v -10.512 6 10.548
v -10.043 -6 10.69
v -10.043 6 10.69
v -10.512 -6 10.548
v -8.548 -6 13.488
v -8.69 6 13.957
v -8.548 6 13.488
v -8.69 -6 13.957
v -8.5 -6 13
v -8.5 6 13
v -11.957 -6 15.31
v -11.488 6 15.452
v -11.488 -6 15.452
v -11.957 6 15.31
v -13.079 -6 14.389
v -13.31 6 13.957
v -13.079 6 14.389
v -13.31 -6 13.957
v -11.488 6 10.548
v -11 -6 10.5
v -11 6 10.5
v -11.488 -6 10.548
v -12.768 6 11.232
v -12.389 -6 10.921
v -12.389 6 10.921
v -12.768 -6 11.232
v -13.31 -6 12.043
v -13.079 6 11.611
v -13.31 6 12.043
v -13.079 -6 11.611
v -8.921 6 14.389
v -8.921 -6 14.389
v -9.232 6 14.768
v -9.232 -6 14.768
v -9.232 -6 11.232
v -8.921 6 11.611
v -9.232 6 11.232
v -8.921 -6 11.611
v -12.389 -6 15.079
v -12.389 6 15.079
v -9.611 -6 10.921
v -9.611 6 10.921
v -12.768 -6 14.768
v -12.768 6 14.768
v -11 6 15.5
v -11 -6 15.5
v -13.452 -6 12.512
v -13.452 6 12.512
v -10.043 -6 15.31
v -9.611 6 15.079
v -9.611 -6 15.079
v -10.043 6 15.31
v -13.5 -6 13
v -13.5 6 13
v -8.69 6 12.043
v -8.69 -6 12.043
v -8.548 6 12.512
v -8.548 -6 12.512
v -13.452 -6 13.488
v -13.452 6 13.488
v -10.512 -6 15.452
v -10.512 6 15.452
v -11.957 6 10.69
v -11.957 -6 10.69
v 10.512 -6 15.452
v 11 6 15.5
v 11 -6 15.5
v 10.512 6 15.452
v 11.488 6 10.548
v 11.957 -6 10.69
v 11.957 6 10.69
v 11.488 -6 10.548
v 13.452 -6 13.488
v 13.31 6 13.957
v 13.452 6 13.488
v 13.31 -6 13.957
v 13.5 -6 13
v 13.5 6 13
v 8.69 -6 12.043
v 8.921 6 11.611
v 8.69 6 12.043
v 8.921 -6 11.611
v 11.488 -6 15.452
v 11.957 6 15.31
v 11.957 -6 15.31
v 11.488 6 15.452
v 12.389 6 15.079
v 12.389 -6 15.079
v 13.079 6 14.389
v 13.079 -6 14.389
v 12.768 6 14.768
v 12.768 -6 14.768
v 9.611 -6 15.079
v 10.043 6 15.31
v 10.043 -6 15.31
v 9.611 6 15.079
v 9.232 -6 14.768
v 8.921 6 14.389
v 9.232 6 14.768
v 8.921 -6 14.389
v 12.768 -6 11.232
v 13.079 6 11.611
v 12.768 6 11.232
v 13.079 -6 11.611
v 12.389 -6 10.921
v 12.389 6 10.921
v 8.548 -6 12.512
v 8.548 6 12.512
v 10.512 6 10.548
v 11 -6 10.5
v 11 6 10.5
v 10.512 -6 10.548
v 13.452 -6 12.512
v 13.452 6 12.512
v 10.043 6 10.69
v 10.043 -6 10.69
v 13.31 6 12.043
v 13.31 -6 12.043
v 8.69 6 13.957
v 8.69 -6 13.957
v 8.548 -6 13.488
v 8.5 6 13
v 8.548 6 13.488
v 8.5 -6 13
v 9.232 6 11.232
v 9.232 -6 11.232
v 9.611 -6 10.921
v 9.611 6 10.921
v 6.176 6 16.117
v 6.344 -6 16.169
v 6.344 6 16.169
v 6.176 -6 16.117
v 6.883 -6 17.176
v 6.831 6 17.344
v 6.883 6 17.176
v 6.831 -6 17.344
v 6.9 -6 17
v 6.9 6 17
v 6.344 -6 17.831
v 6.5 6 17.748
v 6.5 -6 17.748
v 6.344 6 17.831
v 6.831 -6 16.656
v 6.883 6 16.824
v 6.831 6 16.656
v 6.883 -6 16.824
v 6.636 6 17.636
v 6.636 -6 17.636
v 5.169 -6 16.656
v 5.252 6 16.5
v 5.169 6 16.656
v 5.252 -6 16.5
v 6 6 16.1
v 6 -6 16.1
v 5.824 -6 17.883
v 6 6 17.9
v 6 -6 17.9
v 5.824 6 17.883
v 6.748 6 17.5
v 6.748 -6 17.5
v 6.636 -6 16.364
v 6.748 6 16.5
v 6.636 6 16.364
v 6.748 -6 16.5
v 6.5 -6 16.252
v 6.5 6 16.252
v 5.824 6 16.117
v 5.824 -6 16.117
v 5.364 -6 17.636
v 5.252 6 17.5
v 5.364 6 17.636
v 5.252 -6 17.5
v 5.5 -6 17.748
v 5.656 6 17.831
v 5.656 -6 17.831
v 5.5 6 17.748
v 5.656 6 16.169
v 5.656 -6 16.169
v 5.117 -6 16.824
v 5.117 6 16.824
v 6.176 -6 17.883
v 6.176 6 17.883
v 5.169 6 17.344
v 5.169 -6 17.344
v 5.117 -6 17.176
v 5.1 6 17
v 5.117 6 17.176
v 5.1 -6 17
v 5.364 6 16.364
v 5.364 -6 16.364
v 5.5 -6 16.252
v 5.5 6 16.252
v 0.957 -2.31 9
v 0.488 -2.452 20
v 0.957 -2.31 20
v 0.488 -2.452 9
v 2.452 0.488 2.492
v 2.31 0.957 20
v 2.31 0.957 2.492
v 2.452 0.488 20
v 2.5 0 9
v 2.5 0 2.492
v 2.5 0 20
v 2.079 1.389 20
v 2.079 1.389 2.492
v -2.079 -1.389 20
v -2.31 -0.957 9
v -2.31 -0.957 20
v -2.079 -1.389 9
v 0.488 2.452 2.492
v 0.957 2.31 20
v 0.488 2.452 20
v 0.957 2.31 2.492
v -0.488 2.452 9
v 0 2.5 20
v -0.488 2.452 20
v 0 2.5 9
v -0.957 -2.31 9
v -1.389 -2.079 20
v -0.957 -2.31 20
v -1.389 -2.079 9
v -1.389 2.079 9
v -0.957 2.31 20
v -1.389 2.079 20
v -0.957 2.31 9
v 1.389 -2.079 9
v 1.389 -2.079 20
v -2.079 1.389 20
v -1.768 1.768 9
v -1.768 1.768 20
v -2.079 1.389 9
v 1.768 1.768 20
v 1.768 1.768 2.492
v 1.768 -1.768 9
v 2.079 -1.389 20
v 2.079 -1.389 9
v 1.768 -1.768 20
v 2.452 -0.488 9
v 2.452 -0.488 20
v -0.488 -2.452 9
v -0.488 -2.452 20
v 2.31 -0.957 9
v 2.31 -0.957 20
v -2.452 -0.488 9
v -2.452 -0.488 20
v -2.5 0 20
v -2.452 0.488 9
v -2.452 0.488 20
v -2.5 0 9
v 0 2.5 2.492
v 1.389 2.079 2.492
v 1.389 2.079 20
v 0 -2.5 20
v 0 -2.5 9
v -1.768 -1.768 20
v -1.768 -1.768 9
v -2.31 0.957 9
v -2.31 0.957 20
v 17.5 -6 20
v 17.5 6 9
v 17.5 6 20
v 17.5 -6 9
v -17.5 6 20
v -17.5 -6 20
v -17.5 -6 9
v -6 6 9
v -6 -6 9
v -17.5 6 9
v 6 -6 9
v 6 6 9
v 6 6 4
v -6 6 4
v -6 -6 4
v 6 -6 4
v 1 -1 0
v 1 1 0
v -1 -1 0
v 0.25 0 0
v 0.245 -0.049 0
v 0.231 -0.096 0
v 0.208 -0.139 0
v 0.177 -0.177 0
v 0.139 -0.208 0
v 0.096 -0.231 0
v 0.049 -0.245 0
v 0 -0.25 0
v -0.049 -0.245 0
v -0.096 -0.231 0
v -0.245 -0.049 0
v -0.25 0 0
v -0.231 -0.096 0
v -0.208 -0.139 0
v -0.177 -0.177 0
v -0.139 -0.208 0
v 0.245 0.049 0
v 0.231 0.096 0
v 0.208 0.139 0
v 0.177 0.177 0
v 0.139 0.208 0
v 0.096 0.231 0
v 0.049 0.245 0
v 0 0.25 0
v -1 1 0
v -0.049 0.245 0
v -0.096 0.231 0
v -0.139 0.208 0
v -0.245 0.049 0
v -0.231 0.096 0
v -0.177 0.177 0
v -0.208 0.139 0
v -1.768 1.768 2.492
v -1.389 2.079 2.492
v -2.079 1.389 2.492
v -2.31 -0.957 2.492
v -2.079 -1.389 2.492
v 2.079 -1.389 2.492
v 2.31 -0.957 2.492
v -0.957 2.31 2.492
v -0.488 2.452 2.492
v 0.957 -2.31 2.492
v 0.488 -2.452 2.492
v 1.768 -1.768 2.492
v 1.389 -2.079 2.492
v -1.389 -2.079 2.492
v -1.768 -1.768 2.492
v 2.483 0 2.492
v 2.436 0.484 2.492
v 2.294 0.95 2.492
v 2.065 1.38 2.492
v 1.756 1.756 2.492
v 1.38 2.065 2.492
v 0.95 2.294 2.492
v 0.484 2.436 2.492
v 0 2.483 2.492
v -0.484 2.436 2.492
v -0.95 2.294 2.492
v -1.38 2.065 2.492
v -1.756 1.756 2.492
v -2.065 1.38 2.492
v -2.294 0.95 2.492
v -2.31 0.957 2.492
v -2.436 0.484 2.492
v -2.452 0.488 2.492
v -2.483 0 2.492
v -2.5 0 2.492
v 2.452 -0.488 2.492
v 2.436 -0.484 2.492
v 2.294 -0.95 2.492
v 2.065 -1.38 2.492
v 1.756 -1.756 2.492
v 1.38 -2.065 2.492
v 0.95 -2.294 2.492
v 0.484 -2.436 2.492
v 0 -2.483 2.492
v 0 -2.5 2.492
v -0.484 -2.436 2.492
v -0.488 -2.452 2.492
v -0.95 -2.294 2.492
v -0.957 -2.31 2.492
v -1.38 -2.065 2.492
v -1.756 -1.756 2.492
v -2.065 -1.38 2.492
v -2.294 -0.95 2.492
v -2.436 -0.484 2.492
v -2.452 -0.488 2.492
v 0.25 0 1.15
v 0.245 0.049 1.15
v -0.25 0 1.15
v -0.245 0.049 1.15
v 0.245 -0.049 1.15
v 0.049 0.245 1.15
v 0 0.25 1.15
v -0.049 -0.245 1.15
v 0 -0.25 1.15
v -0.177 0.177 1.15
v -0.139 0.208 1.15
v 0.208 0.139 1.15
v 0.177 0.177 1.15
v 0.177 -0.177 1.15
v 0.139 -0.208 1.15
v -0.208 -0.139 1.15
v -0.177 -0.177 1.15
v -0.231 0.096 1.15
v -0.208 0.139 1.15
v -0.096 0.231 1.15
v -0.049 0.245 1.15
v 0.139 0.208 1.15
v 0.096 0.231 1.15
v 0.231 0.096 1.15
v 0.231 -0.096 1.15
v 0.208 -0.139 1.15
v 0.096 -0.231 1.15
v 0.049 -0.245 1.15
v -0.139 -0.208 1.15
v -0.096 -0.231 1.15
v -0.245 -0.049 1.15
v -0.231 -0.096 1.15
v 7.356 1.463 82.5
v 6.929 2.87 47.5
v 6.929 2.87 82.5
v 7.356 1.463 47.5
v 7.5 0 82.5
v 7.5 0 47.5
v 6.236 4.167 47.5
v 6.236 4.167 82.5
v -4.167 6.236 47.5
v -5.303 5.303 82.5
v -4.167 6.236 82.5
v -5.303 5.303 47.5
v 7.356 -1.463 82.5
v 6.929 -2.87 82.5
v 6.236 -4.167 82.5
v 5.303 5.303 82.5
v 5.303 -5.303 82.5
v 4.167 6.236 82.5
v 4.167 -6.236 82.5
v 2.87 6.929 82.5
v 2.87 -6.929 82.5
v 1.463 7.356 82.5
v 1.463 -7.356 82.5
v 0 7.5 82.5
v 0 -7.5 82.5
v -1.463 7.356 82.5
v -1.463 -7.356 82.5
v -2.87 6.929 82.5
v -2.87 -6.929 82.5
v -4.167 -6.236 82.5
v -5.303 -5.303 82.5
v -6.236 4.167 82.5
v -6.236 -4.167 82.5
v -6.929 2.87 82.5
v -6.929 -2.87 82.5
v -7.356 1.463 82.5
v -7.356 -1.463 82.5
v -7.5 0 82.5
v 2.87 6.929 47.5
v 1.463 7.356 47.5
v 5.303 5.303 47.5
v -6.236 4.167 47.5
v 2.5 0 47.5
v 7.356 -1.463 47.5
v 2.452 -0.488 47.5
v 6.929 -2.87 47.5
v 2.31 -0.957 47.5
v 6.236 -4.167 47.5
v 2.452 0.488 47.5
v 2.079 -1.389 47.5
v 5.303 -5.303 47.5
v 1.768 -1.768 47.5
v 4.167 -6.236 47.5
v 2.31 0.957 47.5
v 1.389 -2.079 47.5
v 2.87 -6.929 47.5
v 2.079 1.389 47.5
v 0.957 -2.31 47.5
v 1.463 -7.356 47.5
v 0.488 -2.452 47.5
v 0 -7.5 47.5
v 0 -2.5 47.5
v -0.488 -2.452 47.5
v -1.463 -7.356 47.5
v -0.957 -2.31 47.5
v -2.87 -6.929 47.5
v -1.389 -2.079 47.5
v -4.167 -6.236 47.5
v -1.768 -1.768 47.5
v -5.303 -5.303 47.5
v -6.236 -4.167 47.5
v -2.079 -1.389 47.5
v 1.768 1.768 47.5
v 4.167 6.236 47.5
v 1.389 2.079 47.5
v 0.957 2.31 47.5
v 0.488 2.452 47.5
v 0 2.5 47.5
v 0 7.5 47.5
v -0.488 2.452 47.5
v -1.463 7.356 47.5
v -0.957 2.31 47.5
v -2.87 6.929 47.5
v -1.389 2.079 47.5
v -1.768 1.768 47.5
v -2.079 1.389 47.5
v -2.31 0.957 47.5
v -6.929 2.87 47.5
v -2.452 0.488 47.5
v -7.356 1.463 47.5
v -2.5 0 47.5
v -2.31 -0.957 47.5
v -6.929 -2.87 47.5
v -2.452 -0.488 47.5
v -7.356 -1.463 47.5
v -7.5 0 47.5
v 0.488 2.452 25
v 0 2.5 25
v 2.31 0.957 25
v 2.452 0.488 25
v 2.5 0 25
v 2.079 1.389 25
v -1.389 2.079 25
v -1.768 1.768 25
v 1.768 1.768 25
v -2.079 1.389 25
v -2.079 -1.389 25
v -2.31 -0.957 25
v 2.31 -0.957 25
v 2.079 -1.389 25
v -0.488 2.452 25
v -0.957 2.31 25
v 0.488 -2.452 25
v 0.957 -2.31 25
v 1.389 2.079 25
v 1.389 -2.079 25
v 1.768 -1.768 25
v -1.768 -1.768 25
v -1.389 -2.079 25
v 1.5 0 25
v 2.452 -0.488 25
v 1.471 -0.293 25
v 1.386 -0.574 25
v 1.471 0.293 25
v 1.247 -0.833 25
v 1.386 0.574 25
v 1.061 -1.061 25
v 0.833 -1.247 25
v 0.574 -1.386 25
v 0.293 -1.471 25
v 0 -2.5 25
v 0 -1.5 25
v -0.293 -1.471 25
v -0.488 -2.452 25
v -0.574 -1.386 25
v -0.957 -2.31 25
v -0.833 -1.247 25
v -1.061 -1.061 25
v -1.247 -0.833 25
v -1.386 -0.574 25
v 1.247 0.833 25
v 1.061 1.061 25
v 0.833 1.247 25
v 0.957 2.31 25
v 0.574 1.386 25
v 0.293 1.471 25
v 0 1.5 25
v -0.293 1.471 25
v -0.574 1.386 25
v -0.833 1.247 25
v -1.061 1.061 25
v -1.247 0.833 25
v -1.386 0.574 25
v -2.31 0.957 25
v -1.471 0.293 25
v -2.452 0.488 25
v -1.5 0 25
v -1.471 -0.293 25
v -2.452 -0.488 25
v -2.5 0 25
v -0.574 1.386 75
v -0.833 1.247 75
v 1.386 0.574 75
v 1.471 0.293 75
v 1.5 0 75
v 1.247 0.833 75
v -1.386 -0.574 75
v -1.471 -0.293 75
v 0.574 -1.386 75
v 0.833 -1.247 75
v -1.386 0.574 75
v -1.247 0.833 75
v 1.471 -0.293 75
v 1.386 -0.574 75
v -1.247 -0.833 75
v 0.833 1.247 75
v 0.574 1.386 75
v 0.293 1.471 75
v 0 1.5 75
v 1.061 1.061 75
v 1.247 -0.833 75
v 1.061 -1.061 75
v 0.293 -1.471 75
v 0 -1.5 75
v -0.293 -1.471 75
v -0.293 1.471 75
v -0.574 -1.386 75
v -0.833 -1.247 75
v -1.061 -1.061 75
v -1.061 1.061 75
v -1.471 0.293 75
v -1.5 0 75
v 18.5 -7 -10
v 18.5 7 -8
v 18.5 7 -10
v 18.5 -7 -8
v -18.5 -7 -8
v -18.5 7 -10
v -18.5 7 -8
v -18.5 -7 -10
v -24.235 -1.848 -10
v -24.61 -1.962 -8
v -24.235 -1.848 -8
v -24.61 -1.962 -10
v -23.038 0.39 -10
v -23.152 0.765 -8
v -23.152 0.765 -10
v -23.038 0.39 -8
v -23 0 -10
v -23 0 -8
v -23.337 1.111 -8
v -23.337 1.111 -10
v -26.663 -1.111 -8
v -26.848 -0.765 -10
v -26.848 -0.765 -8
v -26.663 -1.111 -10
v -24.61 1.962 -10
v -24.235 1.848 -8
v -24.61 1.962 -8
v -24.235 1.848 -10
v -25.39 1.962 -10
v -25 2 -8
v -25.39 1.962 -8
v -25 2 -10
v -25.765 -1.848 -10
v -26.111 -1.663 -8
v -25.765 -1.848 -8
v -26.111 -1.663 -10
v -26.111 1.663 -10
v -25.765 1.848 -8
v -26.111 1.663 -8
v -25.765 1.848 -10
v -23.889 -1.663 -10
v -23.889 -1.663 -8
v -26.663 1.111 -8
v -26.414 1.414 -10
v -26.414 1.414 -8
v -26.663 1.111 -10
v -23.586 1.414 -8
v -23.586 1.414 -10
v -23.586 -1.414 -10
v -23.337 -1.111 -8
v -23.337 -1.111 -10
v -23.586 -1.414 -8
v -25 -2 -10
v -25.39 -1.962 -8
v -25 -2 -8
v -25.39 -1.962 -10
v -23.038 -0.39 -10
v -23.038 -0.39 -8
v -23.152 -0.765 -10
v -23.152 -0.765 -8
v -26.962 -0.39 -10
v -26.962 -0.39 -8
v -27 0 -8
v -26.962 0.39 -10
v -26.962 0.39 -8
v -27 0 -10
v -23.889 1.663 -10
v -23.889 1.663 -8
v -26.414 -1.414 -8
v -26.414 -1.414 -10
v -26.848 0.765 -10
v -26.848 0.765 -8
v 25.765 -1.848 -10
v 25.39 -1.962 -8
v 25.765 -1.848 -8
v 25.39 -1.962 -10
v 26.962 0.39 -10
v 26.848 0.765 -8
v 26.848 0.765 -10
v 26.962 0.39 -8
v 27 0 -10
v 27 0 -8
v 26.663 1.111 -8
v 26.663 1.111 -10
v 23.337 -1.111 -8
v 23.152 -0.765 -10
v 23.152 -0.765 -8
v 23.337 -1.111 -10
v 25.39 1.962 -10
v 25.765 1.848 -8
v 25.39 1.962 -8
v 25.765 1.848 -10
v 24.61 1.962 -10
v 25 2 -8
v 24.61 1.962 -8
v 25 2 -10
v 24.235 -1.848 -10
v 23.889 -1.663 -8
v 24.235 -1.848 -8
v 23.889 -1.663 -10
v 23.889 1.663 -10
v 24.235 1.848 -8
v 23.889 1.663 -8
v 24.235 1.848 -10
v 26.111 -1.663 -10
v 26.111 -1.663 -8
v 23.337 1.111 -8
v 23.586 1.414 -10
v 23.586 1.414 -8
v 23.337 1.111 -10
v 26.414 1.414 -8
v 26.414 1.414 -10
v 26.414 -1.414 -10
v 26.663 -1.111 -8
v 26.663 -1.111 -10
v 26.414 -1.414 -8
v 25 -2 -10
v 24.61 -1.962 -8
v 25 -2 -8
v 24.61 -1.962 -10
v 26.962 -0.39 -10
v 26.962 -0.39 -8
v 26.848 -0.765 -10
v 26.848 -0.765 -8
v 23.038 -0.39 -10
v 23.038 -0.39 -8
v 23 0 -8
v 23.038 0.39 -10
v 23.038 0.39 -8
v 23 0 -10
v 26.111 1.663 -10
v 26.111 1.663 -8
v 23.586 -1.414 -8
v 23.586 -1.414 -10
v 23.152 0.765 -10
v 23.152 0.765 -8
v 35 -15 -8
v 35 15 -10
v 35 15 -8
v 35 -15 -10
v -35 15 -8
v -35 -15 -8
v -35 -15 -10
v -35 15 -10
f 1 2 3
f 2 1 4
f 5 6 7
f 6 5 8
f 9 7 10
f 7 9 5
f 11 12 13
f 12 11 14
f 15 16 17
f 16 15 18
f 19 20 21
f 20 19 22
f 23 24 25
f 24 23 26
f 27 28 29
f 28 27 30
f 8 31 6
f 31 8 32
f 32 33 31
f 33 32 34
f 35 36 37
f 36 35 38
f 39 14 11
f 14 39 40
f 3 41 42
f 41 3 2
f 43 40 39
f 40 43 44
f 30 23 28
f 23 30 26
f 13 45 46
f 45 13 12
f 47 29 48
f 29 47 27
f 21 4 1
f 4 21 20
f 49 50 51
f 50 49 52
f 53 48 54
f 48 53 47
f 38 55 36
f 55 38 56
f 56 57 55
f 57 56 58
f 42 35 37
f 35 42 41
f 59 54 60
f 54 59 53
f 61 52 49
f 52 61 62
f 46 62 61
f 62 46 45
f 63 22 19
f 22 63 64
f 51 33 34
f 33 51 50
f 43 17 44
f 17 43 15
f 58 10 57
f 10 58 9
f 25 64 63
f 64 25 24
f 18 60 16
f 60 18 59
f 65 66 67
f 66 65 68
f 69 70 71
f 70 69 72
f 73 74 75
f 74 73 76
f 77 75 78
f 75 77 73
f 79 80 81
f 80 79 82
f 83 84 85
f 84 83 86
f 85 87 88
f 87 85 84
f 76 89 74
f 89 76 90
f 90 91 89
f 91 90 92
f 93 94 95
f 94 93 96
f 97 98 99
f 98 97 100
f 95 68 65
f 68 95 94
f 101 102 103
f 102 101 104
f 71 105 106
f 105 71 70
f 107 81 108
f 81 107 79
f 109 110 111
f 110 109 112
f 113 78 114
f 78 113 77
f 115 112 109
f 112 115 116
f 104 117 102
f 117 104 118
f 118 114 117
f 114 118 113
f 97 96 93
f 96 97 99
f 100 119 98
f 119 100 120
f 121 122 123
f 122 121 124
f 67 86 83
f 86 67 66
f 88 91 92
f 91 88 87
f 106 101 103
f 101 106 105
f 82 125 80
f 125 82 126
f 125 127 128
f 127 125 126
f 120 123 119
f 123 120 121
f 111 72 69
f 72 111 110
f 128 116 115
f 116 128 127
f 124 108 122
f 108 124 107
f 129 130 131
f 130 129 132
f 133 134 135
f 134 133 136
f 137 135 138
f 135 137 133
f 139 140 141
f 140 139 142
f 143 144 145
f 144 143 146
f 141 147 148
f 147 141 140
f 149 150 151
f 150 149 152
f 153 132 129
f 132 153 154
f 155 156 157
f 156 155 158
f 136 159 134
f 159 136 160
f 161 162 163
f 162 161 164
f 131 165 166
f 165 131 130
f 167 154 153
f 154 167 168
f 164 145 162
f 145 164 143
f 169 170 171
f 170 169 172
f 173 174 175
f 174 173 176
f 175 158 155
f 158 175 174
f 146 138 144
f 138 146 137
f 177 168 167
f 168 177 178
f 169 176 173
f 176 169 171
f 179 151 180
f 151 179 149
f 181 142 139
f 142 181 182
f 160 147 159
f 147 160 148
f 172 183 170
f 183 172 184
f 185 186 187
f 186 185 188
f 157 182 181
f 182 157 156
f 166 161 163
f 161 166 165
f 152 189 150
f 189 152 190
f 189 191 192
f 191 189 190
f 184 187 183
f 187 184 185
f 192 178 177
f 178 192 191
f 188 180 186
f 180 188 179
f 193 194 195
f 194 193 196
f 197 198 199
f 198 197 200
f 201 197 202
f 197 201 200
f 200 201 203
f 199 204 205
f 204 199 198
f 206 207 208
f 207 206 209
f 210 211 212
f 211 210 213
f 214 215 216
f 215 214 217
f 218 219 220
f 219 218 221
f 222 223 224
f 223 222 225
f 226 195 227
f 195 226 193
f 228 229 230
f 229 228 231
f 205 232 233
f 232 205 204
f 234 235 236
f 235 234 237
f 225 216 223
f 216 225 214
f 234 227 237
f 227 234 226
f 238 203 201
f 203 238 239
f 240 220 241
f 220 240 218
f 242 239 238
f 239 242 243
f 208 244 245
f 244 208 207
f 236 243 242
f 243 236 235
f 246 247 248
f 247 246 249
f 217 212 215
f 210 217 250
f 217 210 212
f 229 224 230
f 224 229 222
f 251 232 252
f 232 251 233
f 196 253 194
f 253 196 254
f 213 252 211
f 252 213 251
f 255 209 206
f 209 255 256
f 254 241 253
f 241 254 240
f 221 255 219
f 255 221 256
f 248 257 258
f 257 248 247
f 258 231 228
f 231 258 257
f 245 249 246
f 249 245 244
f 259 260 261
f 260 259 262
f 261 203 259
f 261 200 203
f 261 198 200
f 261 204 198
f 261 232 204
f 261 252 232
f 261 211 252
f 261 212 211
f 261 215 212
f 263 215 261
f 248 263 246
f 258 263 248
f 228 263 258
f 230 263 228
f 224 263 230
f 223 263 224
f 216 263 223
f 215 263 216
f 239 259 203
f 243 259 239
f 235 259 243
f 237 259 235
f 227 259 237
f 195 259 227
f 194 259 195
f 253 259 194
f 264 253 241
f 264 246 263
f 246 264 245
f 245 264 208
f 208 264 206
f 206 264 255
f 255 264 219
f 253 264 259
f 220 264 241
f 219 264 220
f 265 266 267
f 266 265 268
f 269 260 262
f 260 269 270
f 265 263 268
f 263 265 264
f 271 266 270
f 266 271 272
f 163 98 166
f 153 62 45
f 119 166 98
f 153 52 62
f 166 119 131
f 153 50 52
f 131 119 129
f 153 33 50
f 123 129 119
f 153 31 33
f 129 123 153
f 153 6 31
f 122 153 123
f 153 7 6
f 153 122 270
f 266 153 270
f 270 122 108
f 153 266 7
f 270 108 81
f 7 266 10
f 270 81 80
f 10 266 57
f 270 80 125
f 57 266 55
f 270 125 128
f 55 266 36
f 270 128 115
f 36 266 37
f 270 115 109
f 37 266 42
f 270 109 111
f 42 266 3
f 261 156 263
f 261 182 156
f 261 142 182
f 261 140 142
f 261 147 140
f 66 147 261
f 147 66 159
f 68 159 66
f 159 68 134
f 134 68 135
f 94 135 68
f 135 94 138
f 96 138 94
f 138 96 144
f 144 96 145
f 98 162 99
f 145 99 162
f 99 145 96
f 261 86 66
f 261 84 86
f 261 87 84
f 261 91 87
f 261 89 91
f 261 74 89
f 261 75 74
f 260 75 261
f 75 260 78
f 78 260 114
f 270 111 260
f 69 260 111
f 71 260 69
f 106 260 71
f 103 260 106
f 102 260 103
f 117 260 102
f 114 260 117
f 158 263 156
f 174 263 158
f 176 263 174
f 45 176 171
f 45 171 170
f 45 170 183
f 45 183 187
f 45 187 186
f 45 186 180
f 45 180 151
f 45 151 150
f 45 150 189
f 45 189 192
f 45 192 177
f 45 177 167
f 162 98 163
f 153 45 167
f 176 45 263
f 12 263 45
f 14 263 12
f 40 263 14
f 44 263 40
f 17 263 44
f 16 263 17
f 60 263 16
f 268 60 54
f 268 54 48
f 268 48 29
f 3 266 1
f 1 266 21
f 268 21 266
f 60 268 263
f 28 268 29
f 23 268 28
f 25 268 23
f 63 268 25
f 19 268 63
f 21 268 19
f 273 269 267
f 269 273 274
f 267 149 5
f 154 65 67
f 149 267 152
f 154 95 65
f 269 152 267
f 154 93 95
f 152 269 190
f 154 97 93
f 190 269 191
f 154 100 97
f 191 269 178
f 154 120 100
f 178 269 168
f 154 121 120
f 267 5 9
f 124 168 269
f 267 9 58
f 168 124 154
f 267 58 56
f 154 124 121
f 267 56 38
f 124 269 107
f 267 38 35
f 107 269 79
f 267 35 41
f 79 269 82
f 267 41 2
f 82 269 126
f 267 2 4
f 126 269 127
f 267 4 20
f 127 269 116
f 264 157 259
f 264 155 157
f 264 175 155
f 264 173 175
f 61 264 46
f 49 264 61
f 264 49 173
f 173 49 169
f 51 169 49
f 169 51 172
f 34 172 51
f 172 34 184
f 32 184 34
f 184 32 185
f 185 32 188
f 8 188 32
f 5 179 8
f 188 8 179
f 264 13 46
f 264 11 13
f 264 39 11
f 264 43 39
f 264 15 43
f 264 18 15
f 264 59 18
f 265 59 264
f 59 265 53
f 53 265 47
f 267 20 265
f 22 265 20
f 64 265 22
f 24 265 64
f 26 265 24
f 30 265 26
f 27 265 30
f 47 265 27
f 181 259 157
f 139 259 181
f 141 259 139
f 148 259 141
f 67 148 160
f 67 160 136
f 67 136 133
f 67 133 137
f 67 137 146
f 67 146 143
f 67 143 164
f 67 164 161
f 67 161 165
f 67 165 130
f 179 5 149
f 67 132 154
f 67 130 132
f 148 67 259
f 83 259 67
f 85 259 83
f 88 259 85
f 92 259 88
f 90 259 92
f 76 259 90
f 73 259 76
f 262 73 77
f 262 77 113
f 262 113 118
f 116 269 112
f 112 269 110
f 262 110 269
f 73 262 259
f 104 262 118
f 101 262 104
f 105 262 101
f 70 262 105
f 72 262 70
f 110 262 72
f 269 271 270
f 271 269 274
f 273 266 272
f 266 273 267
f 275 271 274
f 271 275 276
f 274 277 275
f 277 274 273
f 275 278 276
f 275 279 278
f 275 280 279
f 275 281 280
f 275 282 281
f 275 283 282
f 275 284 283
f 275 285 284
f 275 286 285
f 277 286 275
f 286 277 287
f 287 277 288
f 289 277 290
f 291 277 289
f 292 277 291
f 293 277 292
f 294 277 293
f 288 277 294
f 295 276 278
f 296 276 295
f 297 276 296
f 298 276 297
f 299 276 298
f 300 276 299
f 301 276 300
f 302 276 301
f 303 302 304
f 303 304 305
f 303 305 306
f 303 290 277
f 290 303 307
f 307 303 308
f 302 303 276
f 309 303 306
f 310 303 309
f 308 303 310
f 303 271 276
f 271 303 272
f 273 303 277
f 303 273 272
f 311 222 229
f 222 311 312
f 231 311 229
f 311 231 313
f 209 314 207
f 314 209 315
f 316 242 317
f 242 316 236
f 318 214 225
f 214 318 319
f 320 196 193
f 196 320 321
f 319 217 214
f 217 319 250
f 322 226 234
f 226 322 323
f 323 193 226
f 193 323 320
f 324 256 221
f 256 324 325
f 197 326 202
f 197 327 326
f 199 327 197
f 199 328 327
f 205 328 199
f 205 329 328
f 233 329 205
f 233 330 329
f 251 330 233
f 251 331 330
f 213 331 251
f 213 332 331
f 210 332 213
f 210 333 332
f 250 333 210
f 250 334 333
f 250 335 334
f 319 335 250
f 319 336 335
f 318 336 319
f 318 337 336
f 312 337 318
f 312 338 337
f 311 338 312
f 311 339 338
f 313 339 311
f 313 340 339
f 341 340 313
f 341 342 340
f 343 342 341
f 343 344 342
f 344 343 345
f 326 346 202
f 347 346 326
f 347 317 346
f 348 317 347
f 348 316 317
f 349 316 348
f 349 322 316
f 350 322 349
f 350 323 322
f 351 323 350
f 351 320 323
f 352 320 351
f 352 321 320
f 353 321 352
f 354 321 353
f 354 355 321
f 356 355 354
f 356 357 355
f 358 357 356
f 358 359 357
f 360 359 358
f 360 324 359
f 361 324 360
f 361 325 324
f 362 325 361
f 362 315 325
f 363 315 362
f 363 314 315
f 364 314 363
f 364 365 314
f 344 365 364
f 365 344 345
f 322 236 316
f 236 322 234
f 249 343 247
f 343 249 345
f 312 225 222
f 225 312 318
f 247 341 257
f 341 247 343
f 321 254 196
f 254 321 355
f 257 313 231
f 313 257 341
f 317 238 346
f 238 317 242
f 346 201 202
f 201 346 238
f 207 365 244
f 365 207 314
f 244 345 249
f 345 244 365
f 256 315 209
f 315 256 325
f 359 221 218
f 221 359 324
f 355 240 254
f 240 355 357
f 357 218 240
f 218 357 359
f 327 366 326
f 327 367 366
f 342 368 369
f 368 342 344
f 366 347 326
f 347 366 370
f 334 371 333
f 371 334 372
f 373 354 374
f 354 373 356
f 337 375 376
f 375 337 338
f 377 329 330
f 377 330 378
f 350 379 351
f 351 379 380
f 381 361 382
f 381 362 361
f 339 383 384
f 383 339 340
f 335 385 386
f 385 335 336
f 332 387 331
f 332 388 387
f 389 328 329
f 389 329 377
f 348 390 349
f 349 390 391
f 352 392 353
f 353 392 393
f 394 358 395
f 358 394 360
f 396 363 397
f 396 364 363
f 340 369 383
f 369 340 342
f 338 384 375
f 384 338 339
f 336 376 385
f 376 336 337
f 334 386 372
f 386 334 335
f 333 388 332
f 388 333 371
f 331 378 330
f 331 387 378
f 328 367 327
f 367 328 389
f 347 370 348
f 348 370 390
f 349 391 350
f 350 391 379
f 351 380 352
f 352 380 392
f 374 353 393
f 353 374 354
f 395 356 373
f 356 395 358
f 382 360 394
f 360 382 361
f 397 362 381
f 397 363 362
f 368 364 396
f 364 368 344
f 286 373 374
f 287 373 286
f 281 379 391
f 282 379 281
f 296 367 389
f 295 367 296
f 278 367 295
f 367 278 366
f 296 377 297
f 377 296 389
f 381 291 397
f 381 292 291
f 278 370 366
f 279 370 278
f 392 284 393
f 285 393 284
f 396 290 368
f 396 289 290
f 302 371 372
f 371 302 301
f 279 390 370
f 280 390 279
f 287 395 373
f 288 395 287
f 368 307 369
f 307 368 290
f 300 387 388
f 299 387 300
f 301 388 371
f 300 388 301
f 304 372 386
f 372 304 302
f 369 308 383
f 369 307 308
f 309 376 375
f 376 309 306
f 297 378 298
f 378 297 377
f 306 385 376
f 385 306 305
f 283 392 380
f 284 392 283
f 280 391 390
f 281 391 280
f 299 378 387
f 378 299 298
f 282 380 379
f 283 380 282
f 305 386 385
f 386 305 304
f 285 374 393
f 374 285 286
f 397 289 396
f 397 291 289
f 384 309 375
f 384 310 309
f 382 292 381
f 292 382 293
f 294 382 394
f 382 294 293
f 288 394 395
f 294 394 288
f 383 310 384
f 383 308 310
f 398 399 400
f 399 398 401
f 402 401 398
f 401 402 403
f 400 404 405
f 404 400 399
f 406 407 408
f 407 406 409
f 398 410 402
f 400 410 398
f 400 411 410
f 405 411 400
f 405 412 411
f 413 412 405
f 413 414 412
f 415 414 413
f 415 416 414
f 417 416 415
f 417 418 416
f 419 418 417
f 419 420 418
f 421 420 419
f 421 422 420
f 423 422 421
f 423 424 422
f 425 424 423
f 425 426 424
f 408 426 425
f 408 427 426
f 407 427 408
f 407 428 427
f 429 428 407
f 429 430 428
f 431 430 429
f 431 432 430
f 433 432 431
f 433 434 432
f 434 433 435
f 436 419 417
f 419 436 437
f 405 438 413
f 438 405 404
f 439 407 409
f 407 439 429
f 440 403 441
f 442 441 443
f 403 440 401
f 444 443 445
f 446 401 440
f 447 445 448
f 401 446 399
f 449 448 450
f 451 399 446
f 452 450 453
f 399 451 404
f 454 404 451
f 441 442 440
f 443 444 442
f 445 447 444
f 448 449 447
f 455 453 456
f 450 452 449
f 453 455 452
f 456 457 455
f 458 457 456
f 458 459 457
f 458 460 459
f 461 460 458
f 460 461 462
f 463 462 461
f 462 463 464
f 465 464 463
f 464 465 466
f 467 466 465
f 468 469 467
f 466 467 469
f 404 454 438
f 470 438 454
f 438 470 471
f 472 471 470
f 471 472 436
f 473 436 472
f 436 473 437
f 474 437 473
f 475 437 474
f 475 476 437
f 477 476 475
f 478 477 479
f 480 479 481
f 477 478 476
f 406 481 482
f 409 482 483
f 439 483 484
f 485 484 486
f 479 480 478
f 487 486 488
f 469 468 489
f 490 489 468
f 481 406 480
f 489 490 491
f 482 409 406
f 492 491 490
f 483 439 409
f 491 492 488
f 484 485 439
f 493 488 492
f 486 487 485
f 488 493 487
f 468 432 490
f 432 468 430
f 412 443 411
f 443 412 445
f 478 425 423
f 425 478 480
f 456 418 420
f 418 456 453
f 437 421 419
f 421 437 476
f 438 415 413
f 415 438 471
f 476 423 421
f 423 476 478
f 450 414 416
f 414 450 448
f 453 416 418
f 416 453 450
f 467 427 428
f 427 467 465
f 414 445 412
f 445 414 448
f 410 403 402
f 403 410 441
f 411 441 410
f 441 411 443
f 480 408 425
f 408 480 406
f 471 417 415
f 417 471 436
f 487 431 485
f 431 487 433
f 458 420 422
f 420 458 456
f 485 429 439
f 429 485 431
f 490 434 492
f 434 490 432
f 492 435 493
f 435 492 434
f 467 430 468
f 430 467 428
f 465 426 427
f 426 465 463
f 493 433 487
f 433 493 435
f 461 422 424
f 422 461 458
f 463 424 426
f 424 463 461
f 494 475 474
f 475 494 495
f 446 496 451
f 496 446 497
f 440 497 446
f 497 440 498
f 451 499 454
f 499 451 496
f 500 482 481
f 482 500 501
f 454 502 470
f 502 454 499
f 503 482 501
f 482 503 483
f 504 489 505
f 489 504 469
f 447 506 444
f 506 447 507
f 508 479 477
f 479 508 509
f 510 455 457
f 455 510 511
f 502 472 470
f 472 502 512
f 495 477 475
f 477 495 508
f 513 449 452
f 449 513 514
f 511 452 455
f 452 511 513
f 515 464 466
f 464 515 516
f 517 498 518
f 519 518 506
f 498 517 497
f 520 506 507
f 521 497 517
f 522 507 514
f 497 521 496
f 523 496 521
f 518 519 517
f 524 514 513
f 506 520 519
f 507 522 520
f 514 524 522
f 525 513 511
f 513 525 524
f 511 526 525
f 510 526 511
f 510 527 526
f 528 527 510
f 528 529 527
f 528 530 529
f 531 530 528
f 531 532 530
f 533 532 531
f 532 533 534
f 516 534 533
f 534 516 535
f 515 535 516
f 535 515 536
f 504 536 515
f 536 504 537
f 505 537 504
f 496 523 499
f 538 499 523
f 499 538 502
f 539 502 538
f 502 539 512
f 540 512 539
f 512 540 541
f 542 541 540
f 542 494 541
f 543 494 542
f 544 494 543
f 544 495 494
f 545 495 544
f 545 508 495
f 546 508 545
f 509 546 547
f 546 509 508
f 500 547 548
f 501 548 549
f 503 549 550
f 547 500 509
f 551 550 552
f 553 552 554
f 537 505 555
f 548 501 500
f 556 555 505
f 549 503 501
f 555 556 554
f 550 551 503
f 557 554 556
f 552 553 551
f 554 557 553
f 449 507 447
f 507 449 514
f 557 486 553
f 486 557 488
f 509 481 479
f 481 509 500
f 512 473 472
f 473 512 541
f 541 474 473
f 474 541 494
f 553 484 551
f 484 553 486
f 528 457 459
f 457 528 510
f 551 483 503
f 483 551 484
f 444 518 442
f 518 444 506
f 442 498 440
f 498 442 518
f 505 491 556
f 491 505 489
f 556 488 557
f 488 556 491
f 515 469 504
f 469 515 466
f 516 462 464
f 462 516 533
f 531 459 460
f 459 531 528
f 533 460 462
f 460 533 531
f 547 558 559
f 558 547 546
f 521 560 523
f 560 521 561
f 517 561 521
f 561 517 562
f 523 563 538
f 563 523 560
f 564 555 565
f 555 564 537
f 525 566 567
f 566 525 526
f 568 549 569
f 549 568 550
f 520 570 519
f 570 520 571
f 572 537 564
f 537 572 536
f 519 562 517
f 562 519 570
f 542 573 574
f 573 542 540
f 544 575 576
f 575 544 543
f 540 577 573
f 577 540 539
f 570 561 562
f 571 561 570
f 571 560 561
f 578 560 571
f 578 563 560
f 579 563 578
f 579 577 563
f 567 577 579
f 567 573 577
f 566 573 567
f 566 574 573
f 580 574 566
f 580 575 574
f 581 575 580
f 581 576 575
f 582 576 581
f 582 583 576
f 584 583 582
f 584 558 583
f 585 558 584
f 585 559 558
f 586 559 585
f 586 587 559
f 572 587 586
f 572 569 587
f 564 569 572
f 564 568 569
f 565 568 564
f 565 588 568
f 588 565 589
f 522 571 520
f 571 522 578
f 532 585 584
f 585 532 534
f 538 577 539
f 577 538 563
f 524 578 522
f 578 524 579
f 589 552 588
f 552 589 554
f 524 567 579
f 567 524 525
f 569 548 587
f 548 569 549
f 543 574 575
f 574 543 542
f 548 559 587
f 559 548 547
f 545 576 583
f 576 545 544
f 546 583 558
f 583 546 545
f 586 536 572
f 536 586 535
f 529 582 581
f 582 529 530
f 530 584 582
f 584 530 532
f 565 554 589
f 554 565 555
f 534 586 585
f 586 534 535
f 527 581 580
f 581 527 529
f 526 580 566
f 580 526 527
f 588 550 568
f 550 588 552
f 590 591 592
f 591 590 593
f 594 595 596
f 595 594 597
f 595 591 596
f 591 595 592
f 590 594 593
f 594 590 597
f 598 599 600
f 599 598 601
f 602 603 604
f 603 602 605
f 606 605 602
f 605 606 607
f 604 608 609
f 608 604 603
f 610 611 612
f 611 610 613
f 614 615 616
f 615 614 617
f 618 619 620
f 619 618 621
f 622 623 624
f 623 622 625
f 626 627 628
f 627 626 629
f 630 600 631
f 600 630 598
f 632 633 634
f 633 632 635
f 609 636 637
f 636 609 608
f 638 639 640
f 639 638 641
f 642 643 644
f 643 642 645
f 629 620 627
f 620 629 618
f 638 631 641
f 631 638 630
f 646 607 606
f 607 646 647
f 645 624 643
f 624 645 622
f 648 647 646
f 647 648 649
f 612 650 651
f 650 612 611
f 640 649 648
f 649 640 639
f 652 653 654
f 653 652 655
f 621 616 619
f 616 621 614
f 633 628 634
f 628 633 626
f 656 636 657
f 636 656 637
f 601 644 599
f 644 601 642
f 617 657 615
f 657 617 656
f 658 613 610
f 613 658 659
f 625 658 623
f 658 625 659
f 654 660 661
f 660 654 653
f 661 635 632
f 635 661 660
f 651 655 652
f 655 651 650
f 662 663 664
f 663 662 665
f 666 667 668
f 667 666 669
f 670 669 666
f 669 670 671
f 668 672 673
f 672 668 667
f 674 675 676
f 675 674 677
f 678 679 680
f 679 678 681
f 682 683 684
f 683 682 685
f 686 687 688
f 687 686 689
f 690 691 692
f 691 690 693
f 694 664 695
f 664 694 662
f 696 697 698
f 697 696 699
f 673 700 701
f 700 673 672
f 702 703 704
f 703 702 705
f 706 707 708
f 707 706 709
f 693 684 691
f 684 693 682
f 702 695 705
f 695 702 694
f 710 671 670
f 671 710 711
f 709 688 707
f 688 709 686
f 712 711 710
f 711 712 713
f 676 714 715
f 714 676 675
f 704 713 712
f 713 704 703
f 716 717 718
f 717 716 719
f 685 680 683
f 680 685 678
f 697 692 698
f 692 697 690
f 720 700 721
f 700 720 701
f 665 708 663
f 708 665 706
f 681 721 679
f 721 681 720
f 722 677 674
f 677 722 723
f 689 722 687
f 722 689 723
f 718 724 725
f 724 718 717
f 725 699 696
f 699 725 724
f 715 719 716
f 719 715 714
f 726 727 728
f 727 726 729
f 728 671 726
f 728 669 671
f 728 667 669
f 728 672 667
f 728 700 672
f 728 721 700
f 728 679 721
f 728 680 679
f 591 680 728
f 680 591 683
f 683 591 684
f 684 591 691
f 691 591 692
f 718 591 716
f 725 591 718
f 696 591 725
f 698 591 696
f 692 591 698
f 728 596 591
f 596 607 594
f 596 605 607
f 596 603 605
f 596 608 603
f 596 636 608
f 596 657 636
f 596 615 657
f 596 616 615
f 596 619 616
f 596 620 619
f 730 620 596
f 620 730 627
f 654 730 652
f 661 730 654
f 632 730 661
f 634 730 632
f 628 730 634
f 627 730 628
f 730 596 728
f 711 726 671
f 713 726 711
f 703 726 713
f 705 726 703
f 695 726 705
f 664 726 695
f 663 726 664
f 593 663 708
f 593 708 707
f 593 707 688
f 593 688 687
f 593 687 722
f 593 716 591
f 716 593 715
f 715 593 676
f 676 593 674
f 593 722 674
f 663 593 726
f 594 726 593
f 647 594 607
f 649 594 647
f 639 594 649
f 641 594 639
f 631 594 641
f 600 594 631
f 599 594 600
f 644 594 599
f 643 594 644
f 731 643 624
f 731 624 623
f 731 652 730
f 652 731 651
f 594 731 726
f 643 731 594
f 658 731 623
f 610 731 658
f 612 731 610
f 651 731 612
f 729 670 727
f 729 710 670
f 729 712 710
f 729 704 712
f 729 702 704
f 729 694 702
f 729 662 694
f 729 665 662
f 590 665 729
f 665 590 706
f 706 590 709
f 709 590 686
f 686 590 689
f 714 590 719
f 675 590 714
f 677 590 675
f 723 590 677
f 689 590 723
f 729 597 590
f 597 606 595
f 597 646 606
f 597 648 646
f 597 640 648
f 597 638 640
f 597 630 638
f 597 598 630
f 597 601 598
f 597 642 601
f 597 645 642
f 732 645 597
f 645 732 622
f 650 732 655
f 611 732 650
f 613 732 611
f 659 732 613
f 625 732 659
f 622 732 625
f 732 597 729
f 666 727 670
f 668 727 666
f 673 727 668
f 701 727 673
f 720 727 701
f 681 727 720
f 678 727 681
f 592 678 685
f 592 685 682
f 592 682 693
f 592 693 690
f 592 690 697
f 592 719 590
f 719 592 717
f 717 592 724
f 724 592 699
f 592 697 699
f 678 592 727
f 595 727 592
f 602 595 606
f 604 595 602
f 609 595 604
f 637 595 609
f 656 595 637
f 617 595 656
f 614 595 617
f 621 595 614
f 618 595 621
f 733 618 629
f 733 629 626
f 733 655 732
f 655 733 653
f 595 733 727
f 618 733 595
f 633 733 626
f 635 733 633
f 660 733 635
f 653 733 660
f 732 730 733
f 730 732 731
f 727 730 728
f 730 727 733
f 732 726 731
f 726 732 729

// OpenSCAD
//-----------------------------------------------------------------------------------
// drill and file hotend
// a simple diy hotend which can be built with only a drill press and hand tools
//
// v2 - with double heating resistors and single thermistors
//
// see https://github.com/Stemer114/things/tree/master/drill-and-file-hotend
// (c) 2013 by Stemer114
// License: licensed under the Creative Commons - GNU GPL license.
//          http://www.gnu.org/licenses/gpl-2.0.html
//-----------------------------------------------------------------------------------


//-----------------------------------------------------------------------------------
//display settings
//-----------------------------------------------------------------------------------
show_cross_section  = false;  //enable for cross section
show_debugging_cube = true;  //enable for debugging
show_explode = true;  //enable for explosion view

//color settings
color_hotend           = "LightSkyBlue";
color_insulator_sleeve = "OrangeRed";
color_insulator_rod    = "DarkOrange";
color_mountplate       = "MediumSpringGreen";

//-----------------------------------------------------------------------------------
//configuration settings
//-----------------------------------------------------------------------------------

//filament
dia_filament = 3;

//PTFE insulator
insulator_od = 15;
insulator_id = 5;
insulator_len = 35;
sleeve_od = 5;  //outside diameter of sleeve
sleeve_id = dia_filament;  //filament bore in sleeve
sleeve_delta = 15;  //how much longer is sleeve compared to rod

//heater block (aluminium)
hb_w = 35; //width
hb_d = 12; //depth
hb_h = 11; //height
dia_res = 5;  //heat resistor diameter
dia_therm = 1.8;  //thermistor diameter
dia_centr = sleeve_od;   //central bore for PTFE sleeve

//nozzle block (aluminium)
nb_w = 12;
nb_d = hb_d;
nb_h = 9;
nozzle_dia = 0.5;  //nozzle diameter
nozzle_len = 1.0;  //nozzle length within nozzle block
nozzle_square = 2; //nozzle square (the area surrounding the nozzle bore outside)

//mount plate (aluminium, maybe stainless steel later)
mountplate_length        = 70;
mountplate_width         = 30;
mountplate_thickness     = 2;
mountplate_h1_dia        = 4;      //hole dia
mountplate_h1_offset     = 25;     //hole offset from middle
mountplate_cutout_length = hb_w+2; //cutout dimensions
mountplate_cutout_width  = hb_d+2;

//mechanical settings
drill_bit_angle = 118;  //angle of drill bit tip (normally 118 degrees for HSS drill bit)

//-----------------------------------------------------------------------------------
// main rendering
//-----------------------------------------------------------------------------------

//for debugging, show transparent cube at origin
if (show_debugging_cube)
	%cube(40);


//difference is only really used if cross section enabled
difference()  //difference is only needed if 
{
    union()
    {
        translate([-hb_w/2, -hb_d/2, 0])
            HotEnd();
        translate([0, 0, 50])
            Insulator();

        translate([-mountplate_length/2, -mountplate_width/2, -10])
            MountPlate();
    }

    //create cross section by cutting away cube
    if (show_cross_section)
    {
        translate([-0.5, -hb_d/2, -0.5]) cube([100+1, hb_d, 100+nb_h+1]);
    }

}





//-----------------------------------------------------------------------------------
// modules
//-----------------------------------------------------------------------------------

/* the hot end
   consisting of heater block and nozzle block
*/
module HotEnd()
{
	//rod body
	color(color_hotend, 0.5)
	{
		difference()
		{
			union()
			{
				translate([0, 0, nb_h])
					HeaterBlock();
				translate([(hb_w-nb_w)/2, 0, 0])
					NozzleBlock();
			}
	
			union()
			{
	
			}
		}
	}
}


// the heater block, 
// with bores for heating resistors and thermistor
// without the nozzle
module HeaterBlock()
{
	difference()
	{
		union()
		{
			cube([hb_w, hb_d, hb_h]);
		}
	
		union()
		{
			//heater resistor bore left
			rotate([90, 0, 0]) 
			translate([6.5, 4, -hb_d/2])
				cylinder(hb_d*1.1, dia_res/2, dia_res/2, center=true, $fn=32);

			//heater resistor bore left
			rotate([90, 0, 0]) 
			translate([hb_w-6.5, 4, -hb_d/2])
				cylinder(hb_d*1.1, dia_res/2, dia_res/2, center=true, $fn=32);

			//thermistor bore
			rotate([90, 0, 0]) 
			translate([hb_w-11.5, hb_h-3, -hb_d/2])
				cylinder(hb_d*1.1, dia_therm/2, dia_therm/2, center=true, $fn=32);

			//filament-isolator sleeve bore
			translate([hb_w/2, hb_d/2, hb_h/2])
				cylinder(hb_h*1.1, dia_centr/2, dia_centr/2, center=true, $fn=32);


		}
	}
}


// the nozzle
// with central bore
// and nozzle bore
module NozzleBlock()
{
	difference()
	{
		union()
		{
			//nozzle block upper
			translate([0, 0, 4])
				cube([nb_w, nb_d, nb_h-4]);

			//nozzle block lower
			translate([nb_w/2, nb_d/2, 0])
			rotate([0, 0, 45])
				cylinder(4, nozzle_square/sqrt(2), nb_w/sqrt(2), center=false, $fn=4);

			//translate([0, 0, nozzle_len]) 
			//	drill_hole(dia_centr, nb_h-nozzle_len+0.1, 118);

		}
	
		union()
		{
			//filament-isolator sleeve bore
			//translate([nb_w/2, nb_d/2, nozzle_len])
			//	cylinder(nb_h-nozzle_len+0.1, dia_centr/2, dia_centr/2, center=false, $fn=32);
			translate([nb_w/2, nb_d/2, nozzle_len]) 
				drill_hole(dia_centr, nb_h-nozzle_len+0.1, 118);

			//nozzle bore
			translate([nb_w/2, nb_d/2, nozzle_len/2])
				cylinder(nozzle_len+0.5, nozzle_dia/2, nozzle_dia/2, center=true, $fn=32);

		}
	}
}


// the insulator
// made from PTFE 15mm rod
// with inner PTFE sleeve made from 5mm PTFE rod
module Insulator()
{

	difference()
	{
		union()
		{
			//rod body
			color(color_insulator_rod, 0.5)
			{
			translate([0, 0, sleeve_delta])
			cylinder(insulator_len, insulator_od/2, insulator_od/2, 
					  center=true, $fn=32);
			}

			//sleeve body
			color(color_insulator_sleeve, 0.5)
			{
			cylinder(insulator_len+sleeve_delta, sleeve_od/2, sleeve_od/2, 
					  center=true, $fn=32);
			}
		}
	
		union()
		{
			//inner bore in rod
			//actually need to make separate modules
			//for rod and sleeve and join them
			//translate([0, 0, sleeve_delta])
			//cylinder(insulator_len, insulator_id/2, insulator_id/2, 
			//		  center=true, $fn=32);

			//inner bore in sleeve
			cylinder(insulator_len+sleeve_delta, sleeve_id/2, sleeve_id/2, 
					  center=true, $fn=32);
		}
	}
}


// the mount plate
// with cutout for the hotend
// and with bores for the mounting rods
module MountPlate()
{
	color(color_mountplate, 0.5)
	{

		difference()
		{
			union()
			{
				cube([mountplate_length, mountplate_width, mountplate_thickness]);
			}
		
			union()
			{

				translate([
					mountplate_length/2-mountplate_cutout_length/2,
					-mountplate_cutout_width/2+mountplate_width/2, 
					-0.1
				])
				cube([
					mountplate_cutout_length, 
					mountplate_cutout_width, 
					mountplate_thickness+0.2
				]);

				//mounting rod bore left
				translate([
					mountplate_length/2-mountplate_h1_offset, 
					mountplate_width/2, 
					mountplate_thickness/2
				])
				cylinder(
					mountplate_thickness*1.2, 
					mountplate_h1_dia/2, 
					mountplate_h1_dia/2, center=true, $fn=32
				);

				//mounting rod bore right
				translate([
					mountplate_length/2+mountplate_h1_offset, 
					mountplate_width/2, 
					mountplate_thickness/2
				])
				cylinder(
					mountplate_thickness*1.2, 
					mountplate_h1_dia/2, 
					mountplate_h1_dia/2, center=true, $fn=32
				);

				//cutout for hotend block

			}
		}
	}
}




//-----------------------------------------------------------------------------------
// utility functions
//-----------------------------------------------------------------------------------


//model a hole drilled with drill bit with tip angle (normally 118 degree)
module drill_hole(dia, len, angle)
{
	//calulate values for tip based on angle an diameter
	tip_len = dia / 2 / tan(angle/2);
	union()
	{
		//ground bore
		translate([0, 0, tip_len-0.01]) 
			cylinder(len-tip_len+0.01, dia/2, dia/2, center=false, $fn=32);
		//tip
		cylinder(tip_len, 0, dia/2, center=false, $fn=32);
	}
}
